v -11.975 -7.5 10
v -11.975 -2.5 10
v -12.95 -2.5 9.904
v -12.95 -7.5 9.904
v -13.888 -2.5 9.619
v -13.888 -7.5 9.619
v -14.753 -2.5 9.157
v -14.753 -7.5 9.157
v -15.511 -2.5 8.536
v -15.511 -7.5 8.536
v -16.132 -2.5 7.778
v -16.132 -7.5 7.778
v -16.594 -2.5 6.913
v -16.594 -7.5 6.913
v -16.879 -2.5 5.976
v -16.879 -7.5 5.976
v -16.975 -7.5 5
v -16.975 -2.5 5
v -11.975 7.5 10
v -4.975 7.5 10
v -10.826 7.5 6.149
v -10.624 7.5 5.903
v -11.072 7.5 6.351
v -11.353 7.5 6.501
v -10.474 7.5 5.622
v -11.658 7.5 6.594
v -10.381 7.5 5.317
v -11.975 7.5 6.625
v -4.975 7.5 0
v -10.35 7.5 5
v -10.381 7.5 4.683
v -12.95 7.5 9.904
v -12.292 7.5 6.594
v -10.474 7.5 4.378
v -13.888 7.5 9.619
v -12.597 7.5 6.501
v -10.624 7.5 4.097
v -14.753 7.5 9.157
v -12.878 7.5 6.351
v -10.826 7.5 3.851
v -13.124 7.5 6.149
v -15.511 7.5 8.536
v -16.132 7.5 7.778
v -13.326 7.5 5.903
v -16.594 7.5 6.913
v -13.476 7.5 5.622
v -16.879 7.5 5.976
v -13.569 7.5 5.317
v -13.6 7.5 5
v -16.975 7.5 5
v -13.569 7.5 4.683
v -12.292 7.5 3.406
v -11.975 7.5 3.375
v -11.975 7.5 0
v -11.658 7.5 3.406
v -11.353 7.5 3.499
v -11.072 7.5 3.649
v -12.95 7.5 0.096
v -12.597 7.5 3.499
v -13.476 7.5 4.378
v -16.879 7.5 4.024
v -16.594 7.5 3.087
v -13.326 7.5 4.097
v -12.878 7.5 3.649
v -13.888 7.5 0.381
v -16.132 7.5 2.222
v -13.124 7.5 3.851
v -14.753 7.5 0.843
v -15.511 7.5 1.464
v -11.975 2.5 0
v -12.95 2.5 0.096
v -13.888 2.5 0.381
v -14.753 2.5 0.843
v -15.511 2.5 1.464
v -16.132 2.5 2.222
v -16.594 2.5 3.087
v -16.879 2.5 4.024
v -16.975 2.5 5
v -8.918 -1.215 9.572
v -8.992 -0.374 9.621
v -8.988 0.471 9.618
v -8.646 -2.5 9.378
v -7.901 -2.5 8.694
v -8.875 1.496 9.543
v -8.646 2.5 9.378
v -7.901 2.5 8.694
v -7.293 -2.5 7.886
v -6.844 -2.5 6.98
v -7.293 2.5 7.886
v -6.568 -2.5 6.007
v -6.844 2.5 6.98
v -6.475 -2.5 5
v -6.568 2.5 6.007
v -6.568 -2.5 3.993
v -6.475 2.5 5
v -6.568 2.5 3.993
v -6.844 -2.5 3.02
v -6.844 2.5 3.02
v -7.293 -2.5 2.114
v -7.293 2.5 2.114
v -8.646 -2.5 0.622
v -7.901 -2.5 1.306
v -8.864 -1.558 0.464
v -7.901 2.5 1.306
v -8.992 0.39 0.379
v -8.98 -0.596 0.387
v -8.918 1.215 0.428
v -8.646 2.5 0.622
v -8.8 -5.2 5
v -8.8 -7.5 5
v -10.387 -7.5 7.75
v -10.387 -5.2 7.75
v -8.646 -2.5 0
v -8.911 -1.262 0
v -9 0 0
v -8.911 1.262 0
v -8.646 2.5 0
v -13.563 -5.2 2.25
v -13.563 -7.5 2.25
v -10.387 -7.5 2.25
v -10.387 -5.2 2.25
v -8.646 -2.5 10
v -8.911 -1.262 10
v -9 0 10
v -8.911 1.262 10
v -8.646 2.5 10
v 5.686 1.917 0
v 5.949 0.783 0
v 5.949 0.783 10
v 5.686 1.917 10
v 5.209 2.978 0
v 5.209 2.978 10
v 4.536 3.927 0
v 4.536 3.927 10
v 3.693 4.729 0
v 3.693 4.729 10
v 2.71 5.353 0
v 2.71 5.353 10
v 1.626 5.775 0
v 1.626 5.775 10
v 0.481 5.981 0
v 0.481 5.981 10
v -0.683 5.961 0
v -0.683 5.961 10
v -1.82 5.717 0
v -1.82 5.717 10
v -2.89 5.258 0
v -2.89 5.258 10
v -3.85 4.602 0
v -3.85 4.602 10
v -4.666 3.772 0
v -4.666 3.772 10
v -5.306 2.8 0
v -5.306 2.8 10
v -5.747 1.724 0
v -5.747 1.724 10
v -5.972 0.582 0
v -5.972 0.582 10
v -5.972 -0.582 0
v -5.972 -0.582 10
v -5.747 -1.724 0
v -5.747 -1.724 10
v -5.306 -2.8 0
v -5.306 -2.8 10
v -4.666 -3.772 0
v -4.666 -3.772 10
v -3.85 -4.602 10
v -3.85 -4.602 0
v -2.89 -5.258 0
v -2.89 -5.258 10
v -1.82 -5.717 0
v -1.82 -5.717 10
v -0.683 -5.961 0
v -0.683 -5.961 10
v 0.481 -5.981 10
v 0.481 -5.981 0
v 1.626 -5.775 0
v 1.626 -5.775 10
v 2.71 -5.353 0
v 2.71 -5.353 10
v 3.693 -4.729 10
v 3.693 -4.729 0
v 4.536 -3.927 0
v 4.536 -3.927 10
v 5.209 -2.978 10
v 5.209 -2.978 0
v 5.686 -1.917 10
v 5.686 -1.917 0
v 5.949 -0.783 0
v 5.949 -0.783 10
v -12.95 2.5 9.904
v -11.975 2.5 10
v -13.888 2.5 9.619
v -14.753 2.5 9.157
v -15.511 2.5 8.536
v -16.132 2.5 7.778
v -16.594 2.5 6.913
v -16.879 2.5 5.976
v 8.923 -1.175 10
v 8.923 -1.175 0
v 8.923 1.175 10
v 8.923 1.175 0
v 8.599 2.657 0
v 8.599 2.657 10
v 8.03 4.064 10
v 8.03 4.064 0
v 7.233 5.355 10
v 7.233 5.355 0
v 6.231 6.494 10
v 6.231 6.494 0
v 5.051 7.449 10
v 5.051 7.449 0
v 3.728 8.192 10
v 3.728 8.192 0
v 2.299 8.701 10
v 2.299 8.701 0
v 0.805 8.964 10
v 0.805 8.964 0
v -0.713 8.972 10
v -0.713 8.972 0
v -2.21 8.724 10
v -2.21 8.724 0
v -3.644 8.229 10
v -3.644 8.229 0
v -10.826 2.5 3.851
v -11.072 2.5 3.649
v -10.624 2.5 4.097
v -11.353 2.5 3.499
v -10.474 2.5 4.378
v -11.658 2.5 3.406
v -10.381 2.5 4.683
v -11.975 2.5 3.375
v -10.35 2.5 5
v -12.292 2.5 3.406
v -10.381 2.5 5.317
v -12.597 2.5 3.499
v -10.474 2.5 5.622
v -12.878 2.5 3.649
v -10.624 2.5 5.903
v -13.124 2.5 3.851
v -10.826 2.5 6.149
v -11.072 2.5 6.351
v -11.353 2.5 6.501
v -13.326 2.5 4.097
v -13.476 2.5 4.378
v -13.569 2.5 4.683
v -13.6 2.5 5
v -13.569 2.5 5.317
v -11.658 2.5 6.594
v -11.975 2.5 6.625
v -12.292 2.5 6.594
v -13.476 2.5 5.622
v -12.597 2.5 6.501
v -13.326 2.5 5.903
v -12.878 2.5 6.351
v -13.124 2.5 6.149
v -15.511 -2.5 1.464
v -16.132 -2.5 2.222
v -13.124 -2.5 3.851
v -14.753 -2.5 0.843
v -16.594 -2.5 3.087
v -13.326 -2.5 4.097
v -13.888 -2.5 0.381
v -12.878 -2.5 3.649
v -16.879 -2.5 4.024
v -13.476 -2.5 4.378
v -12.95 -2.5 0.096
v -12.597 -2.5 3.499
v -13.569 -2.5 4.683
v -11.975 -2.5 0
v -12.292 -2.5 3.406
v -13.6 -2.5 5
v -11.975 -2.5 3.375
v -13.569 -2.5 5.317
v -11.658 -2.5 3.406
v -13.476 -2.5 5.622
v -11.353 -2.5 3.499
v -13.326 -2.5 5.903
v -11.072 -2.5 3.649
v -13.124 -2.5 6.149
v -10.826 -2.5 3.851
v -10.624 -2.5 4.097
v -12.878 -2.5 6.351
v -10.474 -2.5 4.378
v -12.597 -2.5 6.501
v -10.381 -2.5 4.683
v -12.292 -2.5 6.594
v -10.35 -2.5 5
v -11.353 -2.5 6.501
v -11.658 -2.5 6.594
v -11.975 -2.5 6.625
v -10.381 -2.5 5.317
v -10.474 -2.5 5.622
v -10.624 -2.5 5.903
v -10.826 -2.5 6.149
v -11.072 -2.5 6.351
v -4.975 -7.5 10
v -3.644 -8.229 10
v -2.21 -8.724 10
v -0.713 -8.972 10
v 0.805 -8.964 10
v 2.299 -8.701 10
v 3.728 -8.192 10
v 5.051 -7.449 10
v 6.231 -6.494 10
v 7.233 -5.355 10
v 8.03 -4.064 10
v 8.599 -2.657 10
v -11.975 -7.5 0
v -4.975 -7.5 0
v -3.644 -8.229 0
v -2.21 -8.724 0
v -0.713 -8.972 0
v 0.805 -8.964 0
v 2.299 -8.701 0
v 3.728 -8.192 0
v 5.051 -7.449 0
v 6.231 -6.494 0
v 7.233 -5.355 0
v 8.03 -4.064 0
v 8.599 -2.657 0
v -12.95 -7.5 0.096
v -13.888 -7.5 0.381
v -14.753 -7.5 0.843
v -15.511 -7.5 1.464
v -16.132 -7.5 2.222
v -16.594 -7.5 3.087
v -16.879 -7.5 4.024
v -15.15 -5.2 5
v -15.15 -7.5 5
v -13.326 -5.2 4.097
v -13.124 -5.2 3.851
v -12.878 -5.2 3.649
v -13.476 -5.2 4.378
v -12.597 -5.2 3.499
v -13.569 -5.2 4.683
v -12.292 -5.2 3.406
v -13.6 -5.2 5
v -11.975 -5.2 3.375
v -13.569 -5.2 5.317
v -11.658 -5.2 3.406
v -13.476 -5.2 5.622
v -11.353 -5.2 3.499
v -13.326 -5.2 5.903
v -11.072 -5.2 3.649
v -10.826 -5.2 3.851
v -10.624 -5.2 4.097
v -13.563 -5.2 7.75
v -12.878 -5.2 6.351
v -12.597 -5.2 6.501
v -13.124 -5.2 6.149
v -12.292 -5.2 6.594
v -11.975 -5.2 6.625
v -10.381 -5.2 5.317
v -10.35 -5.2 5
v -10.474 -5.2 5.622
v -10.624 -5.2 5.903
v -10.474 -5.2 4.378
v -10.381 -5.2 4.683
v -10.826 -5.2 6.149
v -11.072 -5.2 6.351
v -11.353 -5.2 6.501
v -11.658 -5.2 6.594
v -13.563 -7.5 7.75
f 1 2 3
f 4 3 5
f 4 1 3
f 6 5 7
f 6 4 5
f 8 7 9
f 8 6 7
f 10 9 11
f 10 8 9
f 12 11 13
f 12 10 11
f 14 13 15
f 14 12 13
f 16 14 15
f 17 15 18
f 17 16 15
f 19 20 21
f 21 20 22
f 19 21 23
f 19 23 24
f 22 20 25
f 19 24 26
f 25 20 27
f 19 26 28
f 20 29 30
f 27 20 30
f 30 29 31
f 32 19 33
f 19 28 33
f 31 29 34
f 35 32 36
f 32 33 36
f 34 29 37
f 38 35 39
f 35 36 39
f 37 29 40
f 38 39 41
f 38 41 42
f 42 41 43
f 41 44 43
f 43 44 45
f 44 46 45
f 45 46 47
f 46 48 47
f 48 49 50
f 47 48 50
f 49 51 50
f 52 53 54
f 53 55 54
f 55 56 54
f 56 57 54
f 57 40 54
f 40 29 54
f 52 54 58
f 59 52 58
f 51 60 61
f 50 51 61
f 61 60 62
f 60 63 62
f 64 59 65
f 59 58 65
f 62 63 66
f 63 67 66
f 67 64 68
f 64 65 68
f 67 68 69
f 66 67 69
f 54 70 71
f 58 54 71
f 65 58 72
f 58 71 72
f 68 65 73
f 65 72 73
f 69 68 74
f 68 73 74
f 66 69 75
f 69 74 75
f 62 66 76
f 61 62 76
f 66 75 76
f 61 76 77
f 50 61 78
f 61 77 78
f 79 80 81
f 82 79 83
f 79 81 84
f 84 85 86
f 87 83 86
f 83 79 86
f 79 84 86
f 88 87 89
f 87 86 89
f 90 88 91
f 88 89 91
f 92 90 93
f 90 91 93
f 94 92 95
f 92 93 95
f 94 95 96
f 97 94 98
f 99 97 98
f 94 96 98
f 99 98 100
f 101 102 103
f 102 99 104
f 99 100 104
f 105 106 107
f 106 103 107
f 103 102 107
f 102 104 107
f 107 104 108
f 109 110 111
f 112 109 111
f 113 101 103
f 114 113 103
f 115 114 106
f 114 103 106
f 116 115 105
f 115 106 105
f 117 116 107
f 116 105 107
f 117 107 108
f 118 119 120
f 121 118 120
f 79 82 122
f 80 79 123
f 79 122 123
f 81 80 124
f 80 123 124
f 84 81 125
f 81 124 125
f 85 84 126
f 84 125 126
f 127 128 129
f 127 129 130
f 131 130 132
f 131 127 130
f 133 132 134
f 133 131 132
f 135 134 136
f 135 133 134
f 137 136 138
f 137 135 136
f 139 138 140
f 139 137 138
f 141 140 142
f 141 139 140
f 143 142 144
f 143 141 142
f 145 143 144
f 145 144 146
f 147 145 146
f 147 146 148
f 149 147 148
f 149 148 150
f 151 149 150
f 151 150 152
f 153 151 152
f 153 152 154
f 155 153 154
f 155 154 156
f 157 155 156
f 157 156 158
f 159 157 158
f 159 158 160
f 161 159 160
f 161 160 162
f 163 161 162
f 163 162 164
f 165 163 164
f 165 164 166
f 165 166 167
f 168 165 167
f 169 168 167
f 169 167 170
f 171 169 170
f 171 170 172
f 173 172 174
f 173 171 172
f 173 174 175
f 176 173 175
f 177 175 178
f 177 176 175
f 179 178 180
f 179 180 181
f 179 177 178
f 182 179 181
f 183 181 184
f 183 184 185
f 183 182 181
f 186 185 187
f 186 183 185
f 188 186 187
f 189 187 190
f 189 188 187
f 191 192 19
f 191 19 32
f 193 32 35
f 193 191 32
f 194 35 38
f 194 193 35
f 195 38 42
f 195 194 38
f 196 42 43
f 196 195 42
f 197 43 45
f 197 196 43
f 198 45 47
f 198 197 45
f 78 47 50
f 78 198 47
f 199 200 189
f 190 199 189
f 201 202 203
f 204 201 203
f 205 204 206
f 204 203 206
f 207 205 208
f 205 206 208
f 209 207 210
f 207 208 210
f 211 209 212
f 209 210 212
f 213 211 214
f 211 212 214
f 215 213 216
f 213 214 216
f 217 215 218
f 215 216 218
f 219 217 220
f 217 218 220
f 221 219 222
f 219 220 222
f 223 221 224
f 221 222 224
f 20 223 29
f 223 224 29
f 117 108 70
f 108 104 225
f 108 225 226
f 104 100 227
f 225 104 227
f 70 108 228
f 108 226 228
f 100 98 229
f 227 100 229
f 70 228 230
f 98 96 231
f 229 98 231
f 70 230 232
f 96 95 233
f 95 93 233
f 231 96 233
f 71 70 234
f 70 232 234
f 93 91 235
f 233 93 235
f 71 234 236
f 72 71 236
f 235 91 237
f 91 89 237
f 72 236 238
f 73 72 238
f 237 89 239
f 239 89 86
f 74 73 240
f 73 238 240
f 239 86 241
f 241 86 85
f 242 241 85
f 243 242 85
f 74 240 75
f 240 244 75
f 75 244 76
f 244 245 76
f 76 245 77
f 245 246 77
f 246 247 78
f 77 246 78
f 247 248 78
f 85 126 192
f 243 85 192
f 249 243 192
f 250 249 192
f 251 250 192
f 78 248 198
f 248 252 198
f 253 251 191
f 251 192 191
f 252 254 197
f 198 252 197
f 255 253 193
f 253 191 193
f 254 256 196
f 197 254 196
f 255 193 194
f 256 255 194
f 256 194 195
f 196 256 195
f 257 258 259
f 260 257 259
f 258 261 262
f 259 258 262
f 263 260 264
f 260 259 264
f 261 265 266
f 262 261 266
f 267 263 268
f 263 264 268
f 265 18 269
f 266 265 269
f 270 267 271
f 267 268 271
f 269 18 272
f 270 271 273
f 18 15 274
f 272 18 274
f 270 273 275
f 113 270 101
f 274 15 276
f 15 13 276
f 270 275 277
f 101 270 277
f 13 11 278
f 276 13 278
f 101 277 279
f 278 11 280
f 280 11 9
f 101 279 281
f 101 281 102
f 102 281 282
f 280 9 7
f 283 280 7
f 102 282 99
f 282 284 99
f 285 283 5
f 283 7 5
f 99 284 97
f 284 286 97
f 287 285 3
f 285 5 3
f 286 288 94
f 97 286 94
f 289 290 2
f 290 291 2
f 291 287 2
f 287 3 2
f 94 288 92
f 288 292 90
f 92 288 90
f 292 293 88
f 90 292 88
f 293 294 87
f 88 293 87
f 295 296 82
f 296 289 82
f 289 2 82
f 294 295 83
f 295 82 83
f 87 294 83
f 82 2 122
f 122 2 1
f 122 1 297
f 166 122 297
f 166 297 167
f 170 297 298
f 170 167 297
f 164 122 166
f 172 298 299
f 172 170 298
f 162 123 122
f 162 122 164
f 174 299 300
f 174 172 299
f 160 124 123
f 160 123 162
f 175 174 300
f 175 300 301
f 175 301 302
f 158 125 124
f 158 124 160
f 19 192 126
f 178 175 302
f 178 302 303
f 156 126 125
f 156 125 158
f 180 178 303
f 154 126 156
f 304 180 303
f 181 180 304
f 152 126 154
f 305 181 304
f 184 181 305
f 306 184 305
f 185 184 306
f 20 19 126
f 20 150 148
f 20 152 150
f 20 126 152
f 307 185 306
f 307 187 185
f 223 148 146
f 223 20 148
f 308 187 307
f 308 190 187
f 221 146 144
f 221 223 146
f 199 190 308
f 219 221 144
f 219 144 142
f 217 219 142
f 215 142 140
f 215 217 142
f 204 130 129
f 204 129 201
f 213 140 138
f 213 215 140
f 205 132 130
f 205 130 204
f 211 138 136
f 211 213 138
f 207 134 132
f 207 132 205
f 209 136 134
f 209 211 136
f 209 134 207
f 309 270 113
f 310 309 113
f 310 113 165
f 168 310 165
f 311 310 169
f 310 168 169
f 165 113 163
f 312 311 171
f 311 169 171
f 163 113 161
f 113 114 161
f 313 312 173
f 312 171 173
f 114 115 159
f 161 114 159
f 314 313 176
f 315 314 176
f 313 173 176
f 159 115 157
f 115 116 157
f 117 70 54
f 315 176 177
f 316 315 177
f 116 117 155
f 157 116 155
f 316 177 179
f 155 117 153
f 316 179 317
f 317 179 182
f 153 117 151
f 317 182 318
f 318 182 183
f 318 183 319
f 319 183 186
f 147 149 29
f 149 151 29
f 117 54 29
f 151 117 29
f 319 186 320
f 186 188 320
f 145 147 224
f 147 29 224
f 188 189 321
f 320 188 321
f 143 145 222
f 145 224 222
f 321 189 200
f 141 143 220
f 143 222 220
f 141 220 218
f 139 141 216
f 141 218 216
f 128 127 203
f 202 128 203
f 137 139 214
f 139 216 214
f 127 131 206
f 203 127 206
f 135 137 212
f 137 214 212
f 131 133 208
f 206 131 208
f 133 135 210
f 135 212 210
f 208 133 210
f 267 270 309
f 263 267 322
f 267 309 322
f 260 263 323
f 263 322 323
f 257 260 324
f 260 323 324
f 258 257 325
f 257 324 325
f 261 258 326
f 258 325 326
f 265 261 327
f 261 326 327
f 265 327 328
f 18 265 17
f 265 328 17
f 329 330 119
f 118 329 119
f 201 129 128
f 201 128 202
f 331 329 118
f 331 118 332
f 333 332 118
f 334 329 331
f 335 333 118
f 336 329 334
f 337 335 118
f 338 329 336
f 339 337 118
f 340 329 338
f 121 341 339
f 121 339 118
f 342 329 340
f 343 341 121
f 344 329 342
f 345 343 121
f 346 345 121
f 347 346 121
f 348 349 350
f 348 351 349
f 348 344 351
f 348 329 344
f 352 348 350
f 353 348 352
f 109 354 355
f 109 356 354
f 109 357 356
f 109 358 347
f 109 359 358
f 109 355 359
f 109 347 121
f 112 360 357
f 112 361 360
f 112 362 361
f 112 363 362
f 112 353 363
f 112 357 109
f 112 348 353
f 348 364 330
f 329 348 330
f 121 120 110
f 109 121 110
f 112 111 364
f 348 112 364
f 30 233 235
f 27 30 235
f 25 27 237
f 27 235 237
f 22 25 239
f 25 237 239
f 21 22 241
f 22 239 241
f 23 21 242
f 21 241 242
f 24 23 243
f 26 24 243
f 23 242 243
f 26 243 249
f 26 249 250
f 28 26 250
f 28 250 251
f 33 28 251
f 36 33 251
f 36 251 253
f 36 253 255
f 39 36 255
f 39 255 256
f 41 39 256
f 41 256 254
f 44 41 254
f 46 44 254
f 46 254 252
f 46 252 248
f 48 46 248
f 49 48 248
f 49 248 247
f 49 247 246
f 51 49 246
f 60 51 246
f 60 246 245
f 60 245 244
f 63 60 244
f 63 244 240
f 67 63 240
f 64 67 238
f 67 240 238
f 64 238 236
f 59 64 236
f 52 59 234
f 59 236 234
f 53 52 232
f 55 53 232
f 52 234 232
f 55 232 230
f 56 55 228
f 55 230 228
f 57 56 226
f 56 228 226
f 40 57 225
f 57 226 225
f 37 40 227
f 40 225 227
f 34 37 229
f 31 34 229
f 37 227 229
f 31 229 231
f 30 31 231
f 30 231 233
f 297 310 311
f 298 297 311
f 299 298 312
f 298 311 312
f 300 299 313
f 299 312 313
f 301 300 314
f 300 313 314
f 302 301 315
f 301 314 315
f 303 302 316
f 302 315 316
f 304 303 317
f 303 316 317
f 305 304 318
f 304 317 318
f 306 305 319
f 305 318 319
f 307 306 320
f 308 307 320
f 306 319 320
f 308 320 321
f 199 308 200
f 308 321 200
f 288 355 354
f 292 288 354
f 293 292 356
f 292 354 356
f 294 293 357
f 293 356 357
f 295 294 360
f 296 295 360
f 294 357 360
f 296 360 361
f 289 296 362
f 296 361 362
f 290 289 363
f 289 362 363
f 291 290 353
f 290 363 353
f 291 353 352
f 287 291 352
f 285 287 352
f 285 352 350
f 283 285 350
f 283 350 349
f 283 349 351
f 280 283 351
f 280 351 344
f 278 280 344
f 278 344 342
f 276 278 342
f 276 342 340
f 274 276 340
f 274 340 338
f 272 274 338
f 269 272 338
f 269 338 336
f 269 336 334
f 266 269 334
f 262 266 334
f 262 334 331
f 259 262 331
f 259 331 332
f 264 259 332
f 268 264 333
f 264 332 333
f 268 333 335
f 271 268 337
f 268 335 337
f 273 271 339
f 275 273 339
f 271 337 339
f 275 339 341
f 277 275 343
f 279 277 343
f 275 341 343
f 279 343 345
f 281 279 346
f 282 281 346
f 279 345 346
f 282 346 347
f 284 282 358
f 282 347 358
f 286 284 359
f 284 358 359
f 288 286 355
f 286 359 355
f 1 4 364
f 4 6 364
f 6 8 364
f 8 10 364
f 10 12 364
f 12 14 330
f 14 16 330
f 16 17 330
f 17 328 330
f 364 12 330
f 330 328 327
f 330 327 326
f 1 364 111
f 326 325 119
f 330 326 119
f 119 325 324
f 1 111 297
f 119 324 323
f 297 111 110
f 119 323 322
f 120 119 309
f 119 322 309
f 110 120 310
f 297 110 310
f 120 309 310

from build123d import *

# Parameters (mm, degrees)
CROQUIS1_R              = 9
CROQUIS1_R_2            = 6
SALIENTE_EXTRUIR1_DEPTH = 10
CORTAR_EXTRUIR1_DEPTH   = 17.186414056
SALIENTE_EXTRUIR2_START = -10
SALIENTE_EXTRUIR2_DEPTH = 10
REDONDEO1_R             = 5
CROQUIS4_R              = 1.625
CORTAR_EXTRUIR2_DEPTH   = 26.698219636
CORTAR_EXTRUIR4_DEPTH   = 22.659835929
CROQUIS6_R              = 5.5
CORTAR_EXTRUIR5_DEPTH   = 2.5
CORTAR_EXTRUIR6_DEPTH   = 2.3


with BuildPart() as part:
    # Croquis1 → Saliente-Extruir1 (new body)
    with BuildSketch(Plane.XY):
        Circle(CROQUIS1_R)
        Circle(CROQUIS1_R_2, mode=Mode.SUBTRACT)
    extrude(amount=SALIENTE_EXTRUIR1_DEPTH)

    # Croquis2 → Cortar-Extruir1 (cut, through all)
    with BuildSketch(Plane.XY.offset(10)):
        with BuildLine():
            Line((0, 0), (8.923003752, 1.17473573))
            ThreePointArc((8.923003752, 1.17473573), (9, 0), (8.923003752, -1.17473573))
            Line((8.923003752, -1.17473573), (0, 0))
        make_face()
    extrude(amount=-CORTAR_EXTRUIR1_DEPTH, mode=Mode.SUBTRACT)

    # Croquis3 → Saliente-Extruir2 (add)
    with BuildSketch(Plane.XY.offset(10).offset(SALIENTE_EXTRUIR2_START)):
        with BuildLine():
            Line((-4.974937186, 7.5), (-16.974937186, 7.5))
            Line((-16.974937186, 7.5), (-16.974937186, -7.5))
            Line((-16.974937186, -7.5), (-4.974937186, -7.5))
            ThreePointArc((-4.974937186, -7.5), (-9, 0), (-4.974937186, 7.5))
        make_face()
    extrude(amount=SALIENTE_EXTRUIR2_DEPTH)

    # Redondeo1
    redondeo1_edges = [part.edges().sort_by_distance(p)[0] for p in [
        (-16.974937186, 0, 0),
        (-16.974937186, 0, 10),
    ]]
    fillet(redondeo1_edges, radius=REDONDEO1_R - 0.0001)  # a hair under: the kernel refuses the full size

    # Croquis4 → Cortar-Extruir2 (cut, through all)
    with BuildSketch(Plane.XZ.offset(7.5)):
        with Locations((-11.974937186, 5)):
            Circle(CROQUIS4_R)
    extrude(amount=-CORTAR_EXTRUIR2_DEPTH, mode=Mode.SUBTRACT)

    # Croquis5 → Cortar-Extruir4 (cut, through all)
    with BuildSketch(Plane.XY.offset(10)):
        with BuildLine():
            Line((-8.645808233, 2.5), (-21.808614769, 2.5))
            Line((-21.808614769, 2.5), (-21.808614769, -2.5))
            Line((-21.808614769, -2.5), (-8.645808233, -2.5))
            ThreePointArc((-8.645808233, -2.5), (-9, 0), (-8.645808233, 2.5))
        make_face()
    extrude(amount=-CORTAR_EXTRUIR4_DEPTH, mode=Mode.SUBTRACT)

    # Croquis6 → Cortar-Extruir5 (cut, symmetric)
    with BuildSketch(Plane(origin=(0, 0, 0), x_dir=(1, 0, 0), z_dir=(0, 1, 0))):
        with Locations((-11.974937186, -5)):
            Circle(CROQUIS6_R)
    extrude(amount=CORTAR_EXTRUIR5_DEPTH, both=True, mode=Mode.SUBTRACT)

    # Croquis7 → Cortar-Extruir6 (cut)
    with BuildSketch(Plane.XZ.offset(7.5)):
        Polygon((-8.799510705, 5), (-10.387223945, 7.75), (-13.562650426, 7.75), (-15.150363666, 5), (-13.562650426, 2.25), (-10.387223945, 2.25), align=None)
    extrude(amount=-CORTAR_EXTRUIR6_DEPTH, mode=Mode.SUBTRACT)


solid = part.part
